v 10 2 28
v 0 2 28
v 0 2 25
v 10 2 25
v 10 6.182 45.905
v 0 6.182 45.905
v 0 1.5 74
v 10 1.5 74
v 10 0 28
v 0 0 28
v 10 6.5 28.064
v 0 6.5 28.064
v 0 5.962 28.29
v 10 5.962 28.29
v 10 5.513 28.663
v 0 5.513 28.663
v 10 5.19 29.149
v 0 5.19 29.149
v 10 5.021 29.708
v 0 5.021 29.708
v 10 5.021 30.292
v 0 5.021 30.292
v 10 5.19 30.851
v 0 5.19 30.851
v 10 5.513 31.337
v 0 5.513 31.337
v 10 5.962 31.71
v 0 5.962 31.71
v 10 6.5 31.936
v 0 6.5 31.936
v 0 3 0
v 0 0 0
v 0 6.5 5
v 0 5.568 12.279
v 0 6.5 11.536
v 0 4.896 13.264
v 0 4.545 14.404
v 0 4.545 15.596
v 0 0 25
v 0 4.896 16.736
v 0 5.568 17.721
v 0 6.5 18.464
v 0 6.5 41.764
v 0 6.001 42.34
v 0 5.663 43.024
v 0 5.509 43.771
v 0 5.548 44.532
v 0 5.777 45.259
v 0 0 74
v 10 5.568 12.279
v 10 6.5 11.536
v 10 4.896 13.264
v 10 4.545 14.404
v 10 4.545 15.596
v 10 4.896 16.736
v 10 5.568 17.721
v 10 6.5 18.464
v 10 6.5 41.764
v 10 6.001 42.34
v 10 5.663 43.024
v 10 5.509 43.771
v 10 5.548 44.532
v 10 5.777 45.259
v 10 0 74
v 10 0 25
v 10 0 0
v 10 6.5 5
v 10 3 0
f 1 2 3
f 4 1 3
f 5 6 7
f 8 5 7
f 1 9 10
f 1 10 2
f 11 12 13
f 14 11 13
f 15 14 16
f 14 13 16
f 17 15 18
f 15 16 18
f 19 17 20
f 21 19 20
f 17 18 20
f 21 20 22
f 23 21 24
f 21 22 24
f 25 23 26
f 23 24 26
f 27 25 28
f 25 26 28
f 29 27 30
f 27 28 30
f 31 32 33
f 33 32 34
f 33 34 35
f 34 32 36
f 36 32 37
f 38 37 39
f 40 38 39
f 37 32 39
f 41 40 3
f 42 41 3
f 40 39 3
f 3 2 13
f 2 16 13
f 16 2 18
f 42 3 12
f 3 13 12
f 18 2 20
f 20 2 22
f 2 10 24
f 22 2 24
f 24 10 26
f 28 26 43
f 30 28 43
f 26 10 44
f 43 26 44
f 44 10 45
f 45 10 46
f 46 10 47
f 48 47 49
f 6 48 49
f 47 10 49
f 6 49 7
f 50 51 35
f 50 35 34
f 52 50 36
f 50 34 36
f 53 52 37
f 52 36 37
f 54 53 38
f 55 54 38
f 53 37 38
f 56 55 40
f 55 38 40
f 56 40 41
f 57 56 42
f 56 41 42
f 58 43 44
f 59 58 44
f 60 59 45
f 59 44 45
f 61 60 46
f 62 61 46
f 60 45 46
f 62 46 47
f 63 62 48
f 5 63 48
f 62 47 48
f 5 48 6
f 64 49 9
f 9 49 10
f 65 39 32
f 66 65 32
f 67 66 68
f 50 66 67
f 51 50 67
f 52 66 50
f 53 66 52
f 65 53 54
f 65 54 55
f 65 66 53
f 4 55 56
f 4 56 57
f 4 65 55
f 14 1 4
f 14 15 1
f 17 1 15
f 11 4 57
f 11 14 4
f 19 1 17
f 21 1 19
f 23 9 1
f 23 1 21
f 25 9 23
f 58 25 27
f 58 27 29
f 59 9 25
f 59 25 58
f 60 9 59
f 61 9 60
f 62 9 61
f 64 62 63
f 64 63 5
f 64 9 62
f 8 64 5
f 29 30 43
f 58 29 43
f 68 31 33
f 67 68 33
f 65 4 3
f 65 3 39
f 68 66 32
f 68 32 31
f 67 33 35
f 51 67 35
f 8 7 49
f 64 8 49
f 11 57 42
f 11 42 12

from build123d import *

# Parameters (mm, degrees)
F1_DEPTH = 10


with BuildPart() as f1:
    # F0 (on Right) → F1 (new body)
    with BuildSketch(Plane.YZ):
        with BuildLine():
            Line((0, 25), (0, 0))
            Line((0, 0), (3, 0))
            Line((3, 0), (6.5, 5))
            Line((6.5, 5), (6.5, 11.535898))
            ThreePointArc((6.5, 11.535898), (4.5, 15), (6.5, 18.464102))
            Line((6.5, 18.464102), (6.5, 28.063508))
            ThreePointArc((6.5, 28.063508), (5, 30), (6.5, 31.936492))
            Line((6.5, 31.936492), (6.5, 41.763932))
            ThreePointArc((6.5, 41.763932), (5.508779, 43.770658), (6.182494, 45.905037))
            Line((6.182494, 45.905037), (1.5, 74))
            Line((1.5, 74), (0, 74))
            Line((0, 74), (0, 28))
            Line((0, 28), (2, 28))
            Line((2, 28), (2, 25))
            Line((2, 25), (0, 25))
        make_face()
    extrude(amount=F1_DEPTH)


solid = f1.part
